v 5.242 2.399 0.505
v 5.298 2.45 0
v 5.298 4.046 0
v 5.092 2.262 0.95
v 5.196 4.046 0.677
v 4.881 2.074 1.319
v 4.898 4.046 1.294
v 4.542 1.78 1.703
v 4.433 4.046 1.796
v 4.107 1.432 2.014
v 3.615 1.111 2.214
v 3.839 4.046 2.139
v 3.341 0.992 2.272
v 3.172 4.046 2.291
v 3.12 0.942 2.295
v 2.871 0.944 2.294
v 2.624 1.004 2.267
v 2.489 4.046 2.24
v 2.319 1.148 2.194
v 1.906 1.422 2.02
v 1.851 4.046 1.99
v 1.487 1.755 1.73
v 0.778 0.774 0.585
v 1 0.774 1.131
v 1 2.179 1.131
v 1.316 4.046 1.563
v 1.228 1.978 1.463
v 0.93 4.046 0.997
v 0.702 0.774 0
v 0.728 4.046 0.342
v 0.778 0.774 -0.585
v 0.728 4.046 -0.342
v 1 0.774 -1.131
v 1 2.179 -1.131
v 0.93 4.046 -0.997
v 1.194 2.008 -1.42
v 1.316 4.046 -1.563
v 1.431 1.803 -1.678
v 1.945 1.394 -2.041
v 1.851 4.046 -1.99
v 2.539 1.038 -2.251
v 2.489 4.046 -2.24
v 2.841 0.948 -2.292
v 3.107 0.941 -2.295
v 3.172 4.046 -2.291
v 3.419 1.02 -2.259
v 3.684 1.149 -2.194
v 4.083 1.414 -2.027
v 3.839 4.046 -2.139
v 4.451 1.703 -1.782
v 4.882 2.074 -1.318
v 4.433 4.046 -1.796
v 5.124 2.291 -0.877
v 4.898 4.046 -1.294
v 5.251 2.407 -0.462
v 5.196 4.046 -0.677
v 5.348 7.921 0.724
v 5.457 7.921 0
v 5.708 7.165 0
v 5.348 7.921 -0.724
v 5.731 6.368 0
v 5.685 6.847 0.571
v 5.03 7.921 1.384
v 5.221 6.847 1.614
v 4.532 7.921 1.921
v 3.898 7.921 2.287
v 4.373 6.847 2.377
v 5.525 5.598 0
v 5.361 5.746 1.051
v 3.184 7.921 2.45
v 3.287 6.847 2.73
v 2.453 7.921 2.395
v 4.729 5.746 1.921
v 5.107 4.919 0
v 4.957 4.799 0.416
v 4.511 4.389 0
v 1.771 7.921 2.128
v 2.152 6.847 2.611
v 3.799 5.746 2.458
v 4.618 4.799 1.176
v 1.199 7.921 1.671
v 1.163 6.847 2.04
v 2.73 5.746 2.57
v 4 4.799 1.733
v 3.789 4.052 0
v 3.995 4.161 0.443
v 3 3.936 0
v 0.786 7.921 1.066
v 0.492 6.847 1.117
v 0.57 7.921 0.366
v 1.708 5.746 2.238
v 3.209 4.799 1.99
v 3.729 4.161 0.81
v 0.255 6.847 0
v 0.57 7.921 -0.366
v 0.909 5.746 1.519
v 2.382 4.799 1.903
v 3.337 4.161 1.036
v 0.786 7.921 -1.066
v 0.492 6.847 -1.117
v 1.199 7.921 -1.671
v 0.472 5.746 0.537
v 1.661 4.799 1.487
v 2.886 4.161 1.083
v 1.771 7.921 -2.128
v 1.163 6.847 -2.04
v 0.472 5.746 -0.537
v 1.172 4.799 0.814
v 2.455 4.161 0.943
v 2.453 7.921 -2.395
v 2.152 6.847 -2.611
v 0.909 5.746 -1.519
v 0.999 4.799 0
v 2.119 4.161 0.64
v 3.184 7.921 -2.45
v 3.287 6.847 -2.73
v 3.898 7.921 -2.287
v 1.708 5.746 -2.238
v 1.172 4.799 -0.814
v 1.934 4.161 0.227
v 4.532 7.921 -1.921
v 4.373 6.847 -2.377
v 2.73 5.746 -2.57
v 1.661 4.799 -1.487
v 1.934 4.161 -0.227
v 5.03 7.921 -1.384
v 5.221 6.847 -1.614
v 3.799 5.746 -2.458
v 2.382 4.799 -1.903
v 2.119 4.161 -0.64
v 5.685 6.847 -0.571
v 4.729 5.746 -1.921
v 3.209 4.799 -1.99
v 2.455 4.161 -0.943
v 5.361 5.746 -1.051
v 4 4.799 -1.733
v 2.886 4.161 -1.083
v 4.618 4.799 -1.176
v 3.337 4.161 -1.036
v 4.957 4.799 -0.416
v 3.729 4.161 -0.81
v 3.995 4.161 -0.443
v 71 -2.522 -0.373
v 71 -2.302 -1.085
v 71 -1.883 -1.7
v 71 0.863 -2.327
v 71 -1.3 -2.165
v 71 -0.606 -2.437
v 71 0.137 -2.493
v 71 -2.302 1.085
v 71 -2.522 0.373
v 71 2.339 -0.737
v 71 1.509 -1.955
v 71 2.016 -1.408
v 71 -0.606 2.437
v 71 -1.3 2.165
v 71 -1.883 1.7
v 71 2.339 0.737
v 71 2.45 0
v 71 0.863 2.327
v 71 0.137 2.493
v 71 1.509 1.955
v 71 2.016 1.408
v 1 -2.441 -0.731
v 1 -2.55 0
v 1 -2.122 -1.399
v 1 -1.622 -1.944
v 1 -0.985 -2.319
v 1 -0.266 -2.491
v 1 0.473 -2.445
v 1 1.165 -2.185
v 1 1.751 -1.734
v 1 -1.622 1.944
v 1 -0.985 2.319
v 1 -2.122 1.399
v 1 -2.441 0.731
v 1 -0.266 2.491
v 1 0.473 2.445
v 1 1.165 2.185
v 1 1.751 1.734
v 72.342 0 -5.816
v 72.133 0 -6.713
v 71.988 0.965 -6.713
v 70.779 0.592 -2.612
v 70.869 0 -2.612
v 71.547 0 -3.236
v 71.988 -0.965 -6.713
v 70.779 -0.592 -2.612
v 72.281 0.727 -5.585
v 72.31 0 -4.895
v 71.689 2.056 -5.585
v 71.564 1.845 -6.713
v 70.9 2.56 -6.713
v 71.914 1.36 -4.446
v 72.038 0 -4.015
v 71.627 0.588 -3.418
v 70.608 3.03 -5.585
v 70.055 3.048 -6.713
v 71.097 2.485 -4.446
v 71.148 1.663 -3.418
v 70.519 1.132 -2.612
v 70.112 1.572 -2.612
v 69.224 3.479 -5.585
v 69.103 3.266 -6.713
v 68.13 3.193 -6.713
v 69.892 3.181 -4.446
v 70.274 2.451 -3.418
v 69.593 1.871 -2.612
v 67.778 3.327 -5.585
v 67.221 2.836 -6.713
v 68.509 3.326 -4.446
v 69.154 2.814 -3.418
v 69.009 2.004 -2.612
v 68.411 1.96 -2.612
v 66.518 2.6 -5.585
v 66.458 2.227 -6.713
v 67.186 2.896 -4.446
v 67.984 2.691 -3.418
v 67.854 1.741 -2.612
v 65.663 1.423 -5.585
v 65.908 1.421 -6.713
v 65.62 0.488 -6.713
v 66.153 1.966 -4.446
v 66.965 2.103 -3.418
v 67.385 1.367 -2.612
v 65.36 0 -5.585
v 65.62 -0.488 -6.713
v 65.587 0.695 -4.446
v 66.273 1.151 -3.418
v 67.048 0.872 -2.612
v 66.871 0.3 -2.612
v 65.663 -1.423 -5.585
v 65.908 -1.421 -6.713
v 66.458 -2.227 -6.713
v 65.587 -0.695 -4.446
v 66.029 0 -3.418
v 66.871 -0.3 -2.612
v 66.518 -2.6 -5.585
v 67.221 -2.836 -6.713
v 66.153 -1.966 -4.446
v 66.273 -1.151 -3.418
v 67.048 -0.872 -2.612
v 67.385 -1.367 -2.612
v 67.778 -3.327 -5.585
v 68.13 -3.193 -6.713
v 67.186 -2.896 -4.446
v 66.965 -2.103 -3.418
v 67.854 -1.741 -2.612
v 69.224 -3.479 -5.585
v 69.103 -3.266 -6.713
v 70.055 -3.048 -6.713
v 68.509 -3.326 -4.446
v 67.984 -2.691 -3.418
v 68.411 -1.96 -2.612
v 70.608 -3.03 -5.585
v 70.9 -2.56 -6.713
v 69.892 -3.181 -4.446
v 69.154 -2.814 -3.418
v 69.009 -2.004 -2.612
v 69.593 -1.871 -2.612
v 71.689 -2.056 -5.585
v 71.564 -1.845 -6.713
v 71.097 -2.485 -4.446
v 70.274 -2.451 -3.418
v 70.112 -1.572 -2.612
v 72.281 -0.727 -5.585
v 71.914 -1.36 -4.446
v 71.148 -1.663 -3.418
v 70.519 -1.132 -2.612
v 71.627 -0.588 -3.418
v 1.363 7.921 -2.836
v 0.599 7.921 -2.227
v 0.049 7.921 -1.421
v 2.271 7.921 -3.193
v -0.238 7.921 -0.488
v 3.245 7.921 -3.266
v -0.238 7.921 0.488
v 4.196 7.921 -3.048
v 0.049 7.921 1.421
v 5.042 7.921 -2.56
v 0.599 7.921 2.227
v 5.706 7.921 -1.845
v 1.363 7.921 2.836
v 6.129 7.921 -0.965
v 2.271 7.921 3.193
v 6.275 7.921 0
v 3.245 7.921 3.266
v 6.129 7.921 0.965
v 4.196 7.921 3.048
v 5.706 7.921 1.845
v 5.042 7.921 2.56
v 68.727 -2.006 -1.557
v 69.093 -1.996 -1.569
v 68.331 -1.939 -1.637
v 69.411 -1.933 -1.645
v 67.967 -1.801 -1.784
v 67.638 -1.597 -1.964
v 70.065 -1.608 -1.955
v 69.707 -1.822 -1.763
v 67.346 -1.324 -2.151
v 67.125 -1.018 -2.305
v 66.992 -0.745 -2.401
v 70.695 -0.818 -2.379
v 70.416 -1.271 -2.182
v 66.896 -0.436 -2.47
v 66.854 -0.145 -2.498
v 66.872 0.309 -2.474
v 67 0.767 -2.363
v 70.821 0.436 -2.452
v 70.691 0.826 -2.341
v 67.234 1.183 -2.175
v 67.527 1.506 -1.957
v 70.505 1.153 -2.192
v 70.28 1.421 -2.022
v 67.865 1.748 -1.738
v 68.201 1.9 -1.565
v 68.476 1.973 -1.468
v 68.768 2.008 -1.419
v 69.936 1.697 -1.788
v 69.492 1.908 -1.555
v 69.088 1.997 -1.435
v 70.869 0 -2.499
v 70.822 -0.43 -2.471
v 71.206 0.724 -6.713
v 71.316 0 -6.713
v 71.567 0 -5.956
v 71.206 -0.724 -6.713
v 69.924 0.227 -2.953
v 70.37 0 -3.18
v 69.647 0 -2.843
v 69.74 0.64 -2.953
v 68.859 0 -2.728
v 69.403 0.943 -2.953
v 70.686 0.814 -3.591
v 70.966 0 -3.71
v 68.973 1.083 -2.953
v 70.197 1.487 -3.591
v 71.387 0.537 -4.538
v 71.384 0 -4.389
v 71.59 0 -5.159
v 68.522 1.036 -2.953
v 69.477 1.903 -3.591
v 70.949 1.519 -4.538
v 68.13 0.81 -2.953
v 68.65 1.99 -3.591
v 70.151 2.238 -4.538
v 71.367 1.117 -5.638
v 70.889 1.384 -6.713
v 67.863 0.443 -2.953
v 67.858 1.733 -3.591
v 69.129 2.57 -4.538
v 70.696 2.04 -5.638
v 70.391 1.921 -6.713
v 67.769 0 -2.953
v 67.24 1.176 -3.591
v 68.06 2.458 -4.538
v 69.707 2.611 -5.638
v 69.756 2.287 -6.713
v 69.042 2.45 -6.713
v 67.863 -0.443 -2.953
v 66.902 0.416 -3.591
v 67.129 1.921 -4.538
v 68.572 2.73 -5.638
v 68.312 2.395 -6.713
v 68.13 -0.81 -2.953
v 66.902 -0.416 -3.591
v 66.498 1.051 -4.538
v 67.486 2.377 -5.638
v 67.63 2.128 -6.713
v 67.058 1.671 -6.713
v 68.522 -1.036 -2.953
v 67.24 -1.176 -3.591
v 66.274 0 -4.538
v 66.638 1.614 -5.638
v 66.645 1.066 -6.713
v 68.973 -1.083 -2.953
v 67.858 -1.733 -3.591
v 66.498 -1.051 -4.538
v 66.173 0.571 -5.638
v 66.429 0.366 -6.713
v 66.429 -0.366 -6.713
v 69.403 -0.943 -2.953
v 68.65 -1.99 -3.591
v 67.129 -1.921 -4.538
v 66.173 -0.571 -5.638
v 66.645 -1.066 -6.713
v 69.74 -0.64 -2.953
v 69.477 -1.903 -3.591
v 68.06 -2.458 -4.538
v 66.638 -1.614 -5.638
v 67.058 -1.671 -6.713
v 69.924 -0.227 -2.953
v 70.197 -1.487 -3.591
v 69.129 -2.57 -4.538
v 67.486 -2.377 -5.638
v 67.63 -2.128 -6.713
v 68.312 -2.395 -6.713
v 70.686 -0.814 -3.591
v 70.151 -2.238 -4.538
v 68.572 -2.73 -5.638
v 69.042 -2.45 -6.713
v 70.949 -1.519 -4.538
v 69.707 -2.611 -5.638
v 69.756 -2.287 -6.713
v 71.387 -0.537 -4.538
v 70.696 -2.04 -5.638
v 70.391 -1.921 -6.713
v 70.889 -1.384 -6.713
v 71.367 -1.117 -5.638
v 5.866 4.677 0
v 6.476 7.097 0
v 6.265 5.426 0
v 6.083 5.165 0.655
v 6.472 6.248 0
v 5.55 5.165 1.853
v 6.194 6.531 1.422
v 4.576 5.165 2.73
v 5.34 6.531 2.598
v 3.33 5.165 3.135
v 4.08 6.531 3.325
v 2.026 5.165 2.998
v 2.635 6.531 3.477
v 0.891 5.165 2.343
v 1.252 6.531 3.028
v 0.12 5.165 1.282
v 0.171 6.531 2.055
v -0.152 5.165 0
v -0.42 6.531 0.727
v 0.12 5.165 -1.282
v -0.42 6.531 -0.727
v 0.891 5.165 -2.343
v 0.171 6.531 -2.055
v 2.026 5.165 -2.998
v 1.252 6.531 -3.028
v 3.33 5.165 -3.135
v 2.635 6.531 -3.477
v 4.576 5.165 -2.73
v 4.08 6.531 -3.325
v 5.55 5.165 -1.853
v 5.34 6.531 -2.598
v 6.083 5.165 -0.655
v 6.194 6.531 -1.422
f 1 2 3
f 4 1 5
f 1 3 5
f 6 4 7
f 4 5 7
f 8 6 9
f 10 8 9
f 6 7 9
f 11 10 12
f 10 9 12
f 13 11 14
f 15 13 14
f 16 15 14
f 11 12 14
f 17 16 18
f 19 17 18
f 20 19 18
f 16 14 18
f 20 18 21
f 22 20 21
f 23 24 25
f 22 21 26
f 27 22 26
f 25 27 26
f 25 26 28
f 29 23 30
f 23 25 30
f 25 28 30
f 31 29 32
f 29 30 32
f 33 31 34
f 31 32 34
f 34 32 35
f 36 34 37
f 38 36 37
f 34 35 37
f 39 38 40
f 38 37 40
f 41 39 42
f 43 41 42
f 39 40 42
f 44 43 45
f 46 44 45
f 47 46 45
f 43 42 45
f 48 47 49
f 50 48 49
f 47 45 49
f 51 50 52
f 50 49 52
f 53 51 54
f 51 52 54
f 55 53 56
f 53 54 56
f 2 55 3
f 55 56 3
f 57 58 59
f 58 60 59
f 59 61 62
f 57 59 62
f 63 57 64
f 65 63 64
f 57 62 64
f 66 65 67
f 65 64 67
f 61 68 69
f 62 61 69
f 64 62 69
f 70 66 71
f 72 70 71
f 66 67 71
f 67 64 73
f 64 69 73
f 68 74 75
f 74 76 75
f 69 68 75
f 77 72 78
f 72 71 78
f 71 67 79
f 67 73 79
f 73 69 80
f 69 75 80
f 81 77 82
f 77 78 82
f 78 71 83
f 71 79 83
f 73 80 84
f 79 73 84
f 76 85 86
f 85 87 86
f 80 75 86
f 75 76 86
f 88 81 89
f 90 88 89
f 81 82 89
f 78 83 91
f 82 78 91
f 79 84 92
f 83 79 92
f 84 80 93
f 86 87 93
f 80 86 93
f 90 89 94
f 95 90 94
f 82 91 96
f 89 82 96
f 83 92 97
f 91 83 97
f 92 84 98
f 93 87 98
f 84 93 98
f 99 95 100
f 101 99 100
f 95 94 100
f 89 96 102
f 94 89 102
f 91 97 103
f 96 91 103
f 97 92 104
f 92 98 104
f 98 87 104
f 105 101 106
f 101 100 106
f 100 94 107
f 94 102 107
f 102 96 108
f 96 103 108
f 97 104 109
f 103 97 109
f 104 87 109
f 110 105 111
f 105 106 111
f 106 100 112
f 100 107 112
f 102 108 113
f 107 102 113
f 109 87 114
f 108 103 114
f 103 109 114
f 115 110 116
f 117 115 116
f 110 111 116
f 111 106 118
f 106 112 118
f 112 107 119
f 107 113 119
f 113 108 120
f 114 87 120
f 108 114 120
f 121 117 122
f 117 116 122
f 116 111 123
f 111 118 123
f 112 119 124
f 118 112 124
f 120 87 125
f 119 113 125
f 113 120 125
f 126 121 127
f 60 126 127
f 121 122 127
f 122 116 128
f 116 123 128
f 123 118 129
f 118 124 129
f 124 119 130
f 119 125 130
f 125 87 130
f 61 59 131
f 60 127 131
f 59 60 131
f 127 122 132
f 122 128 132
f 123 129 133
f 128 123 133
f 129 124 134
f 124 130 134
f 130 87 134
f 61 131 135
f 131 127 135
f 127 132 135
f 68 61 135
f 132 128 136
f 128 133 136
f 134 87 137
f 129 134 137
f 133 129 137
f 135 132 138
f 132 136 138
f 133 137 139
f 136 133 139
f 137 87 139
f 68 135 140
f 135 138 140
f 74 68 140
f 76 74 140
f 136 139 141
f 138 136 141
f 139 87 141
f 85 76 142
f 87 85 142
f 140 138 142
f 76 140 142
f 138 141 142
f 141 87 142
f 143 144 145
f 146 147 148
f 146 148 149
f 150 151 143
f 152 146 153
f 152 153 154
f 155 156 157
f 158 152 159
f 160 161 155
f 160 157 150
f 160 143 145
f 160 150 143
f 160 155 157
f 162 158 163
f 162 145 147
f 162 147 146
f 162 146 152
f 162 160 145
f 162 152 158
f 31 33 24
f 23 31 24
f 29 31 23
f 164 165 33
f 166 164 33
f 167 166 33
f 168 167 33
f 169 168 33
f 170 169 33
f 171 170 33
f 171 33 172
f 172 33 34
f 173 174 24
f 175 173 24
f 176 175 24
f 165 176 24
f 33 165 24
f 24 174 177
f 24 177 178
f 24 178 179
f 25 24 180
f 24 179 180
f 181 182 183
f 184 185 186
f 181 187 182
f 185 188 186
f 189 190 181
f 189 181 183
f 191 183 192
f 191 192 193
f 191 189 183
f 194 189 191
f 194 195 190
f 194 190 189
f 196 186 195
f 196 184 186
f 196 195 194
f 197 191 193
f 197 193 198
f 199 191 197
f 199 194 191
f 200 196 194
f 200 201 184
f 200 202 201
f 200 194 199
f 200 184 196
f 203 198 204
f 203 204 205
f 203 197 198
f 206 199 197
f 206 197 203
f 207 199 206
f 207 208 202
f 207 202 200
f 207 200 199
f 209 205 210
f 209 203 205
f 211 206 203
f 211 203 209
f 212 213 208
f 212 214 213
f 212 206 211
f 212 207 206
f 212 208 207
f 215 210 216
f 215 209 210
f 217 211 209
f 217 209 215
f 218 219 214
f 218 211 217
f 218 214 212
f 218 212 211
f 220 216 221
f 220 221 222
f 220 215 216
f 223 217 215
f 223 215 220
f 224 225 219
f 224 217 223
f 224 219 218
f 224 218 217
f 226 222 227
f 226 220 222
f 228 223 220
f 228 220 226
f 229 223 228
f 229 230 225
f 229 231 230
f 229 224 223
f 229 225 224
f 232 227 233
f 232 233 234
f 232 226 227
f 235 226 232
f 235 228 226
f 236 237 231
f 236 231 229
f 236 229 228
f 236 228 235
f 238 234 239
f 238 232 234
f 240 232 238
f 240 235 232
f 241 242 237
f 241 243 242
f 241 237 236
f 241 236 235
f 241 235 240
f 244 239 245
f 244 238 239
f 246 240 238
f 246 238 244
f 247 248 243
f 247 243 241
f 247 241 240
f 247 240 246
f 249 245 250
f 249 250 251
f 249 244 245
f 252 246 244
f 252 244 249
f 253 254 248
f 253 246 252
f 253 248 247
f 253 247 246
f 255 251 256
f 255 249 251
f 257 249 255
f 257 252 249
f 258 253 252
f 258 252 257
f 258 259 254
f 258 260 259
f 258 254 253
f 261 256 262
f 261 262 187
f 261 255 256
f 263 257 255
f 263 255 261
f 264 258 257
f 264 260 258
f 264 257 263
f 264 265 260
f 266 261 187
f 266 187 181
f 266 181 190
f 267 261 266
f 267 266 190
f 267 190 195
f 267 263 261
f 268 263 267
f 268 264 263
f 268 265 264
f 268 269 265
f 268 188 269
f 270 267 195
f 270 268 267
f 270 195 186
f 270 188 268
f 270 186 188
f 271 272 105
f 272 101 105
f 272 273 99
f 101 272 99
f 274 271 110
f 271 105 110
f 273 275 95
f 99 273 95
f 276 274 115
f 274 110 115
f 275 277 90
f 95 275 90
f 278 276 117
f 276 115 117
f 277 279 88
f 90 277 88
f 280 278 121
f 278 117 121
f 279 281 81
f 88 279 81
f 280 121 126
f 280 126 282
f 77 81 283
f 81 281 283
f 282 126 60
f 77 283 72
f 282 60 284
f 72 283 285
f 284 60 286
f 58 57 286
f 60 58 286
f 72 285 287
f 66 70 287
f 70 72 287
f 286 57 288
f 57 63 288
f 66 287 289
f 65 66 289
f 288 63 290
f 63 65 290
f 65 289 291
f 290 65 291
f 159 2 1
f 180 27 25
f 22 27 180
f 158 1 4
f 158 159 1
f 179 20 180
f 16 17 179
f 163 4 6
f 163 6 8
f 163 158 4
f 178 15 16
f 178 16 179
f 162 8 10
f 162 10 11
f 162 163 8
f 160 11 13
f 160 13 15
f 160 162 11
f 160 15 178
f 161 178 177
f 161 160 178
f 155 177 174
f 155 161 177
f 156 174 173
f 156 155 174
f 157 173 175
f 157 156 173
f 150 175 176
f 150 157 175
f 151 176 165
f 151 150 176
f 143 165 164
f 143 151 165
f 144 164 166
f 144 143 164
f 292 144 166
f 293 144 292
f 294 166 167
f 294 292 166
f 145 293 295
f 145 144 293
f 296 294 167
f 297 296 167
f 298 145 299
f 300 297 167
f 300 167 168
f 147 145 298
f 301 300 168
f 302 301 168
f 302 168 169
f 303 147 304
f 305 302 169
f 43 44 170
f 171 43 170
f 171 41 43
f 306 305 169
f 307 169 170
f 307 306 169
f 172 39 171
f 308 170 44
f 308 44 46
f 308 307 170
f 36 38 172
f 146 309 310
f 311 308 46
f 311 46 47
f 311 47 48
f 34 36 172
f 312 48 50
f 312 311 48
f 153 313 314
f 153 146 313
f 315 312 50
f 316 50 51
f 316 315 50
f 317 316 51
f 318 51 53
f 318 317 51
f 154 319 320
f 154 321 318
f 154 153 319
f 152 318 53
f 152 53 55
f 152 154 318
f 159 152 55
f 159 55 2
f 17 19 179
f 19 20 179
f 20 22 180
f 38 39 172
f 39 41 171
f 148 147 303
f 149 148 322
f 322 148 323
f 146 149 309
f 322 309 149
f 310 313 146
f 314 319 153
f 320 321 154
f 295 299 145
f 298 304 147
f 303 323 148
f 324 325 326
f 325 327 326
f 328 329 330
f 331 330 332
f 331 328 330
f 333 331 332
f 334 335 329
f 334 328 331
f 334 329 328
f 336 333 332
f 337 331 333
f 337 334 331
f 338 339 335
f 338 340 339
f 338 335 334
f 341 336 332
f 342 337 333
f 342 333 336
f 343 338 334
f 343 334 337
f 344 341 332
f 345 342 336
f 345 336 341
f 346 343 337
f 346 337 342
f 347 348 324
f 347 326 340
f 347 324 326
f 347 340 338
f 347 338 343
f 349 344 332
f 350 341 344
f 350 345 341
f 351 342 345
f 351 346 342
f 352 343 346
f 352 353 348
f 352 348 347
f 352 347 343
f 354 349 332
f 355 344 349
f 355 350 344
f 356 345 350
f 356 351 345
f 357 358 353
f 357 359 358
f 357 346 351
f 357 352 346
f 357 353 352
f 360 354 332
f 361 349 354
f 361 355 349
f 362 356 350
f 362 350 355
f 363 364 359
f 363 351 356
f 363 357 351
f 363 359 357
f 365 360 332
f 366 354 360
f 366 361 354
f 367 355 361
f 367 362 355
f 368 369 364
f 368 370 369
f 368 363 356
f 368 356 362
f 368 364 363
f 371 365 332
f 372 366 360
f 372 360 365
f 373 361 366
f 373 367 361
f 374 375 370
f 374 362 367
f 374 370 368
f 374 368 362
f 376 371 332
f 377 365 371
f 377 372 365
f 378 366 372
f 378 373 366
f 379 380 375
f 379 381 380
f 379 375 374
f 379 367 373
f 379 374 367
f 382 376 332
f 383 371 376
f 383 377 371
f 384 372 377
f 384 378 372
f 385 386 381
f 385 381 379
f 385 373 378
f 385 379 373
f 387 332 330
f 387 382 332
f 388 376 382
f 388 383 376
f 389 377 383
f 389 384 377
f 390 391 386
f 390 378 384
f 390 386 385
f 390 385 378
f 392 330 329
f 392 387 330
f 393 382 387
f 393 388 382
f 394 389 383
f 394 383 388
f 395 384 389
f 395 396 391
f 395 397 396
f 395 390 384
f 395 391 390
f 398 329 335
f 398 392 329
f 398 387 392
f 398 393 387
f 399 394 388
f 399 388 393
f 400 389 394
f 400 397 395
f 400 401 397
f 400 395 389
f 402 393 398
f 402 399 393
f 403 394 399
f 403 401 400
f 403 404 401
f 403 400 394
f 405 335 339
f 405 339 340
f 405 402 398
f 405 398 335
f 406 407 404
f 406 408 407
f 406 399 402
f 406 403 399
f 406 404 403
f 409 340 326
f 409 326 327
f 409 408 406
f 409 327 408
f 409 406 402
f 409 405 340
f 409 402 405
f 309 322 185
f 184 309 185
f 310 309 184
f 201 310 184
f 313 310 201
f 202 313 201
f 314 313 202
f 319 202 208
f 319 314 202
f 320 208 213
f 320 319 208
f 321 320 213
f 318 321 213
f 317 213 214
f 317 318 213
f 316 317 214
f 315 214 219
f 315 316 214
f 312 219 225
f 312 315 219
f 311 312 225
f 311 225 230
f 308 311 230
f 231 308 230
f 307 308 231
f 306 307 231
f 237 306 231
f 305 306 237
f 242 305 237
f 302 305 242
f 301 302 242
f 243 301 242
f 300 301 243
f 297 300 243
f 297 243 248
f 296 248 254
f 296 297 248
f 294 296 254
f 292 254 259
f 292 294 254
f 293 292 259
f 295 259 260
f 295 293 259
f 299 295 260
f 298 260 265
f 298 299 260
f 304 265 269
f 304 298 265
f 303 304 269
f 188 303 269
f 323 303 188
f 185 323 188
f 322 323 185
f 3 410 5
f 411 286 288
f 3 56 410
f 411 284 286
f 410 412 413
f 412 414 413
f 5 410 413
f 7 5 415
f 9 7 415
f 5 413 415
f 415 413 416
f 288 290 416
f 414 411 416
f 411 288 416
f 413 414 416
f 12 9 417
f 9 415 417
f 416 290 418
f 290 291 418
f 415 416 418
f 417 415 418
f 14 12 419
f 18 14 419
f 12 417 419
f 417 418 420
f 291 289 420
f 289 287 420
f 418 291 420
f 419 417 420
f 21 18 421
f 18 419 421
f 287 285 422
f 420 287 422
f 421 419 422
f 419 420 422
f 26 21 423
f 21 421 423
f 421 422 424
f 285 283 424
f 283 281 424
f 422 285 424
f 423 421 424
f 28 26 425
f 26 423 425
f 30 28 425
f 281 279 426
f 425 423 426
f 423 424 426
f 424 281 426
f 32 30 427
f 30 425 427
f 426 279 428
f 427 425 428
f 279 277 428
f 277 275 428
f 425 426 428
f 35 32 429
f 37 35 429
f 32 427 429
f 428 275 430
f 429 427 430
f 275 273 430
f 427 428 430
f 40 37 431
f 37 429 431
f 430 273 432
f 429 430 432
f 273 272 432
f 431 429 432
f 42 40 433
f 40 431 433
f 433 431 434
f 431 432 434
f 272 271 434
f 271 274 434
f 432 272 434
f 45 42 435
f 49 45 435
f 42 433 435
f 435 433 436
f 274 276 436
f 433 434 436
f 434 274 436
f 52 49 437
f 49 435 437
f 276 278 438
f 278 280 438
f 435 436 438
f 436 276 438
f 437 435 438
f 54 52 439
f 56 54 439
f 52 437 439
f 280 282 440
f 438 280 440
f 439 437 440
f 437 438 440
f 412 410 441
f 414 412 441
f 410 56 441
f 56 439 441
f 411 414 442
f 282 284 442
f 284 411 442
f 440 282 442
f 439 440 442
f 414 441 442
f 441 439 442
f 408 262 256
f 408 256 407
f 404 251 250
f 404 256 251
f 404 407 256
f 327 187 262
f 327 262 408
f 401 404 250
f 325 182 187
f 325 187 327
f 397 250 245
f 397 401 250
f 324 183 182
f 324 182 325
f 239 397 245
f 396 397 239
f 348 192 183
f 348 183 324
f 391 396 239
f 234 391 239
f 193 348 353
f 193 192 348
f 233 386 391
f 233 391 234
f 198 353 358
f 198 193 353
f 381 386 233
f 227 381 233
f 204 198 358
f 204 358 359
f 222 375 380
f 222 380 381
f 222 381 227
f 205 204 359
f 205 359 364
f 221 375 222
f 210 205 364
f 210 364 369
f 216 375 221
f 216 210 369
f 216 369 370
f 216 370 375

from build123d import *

# Parameters (mm, degrees)
F3_R     = 2.5
F4_DEPTH = 35


with BuildPart() as f1:
    # F0 (on Top) → F1 (revolve)
    with BuildSketch(Plane.XY):
        with BuildLine():
            Line((3, 10.3863353059), (3, 7.9742954113))
            Line((3, 7.9742954113), (5.297709696, 7.9742954113))
            Line((5.297709696, 7.9742954113), (5.297709696, 10.7682199602))
            Line((5.297709696, 10.7682199602), (5.297709696, 11.2461591464))
            ThreePointArc((5.297709696, 11.2461591464), (4.226658763, 10.6083316025), (3, 10.3863353059))
        make_face()
        with BuildLine():
            Line((3, 11.1363353059), (3, 10.3863353059))
            ThreePointArc((3, 10.3863353059), (4.226658763, 10.6083316025), (5.297709696, 11.2461591464))
            ThreePointArc((5.297709696, 11.2461591464), (6.3937863673, 13.0306402124), (6.2748163897, 15.1214780561))
            Line((6.2748163897, 15.1214780561), (5.4570149341, 15.1214780561))
            ThreePointArc((5.4570149341, 15.1214780561), (5.3408484106, 12.4430998024), (3, 11.1363353059))
        make_face()
    revolve(axis=Axis((3, 12.1363353059, 0), (0, -1, 0)))

    # F3 (on offset) → F4 (join, symmetric)
    with BuildSketch(Plane.YZ.offset(36)):
        with Locations((7.1499980986, 0)):
            Circle(F3_R)
    extrude(amount=F4_DEPTH, both=True)


with BuildPart() as f1_1:
    # F5: moved
    add(f1.part.moved(Location((0, -7.2, 0))))

    # F6 (on Front) → F7 (revolve)
    with BuildSketch(Plane.XZ):
        with BuildLine():
            ThreePointArc((68.8586309552, -2.7275545988), (71.1994793659, -4.0343190953), (71.3156458893, -6.712697349))
            Line((71.3156458893, -6.712697349), (72.133447345, -6.712697349))
            ThreePointArc((72.133447345, -6.712697349), (72.2031454778, -4.4459429431), (70.8686844446, -2.612299816))
            ThreePointArc((70.8686844446, -2.612299816), (69.9125778847, -2.1400112103), (68.8586309552, -1.9775545988))
            Line((68.8586309552, -1.9775545988), (68.8586309552, -2.7275545988))
        make_face()
        with BuildLine():
            Line((68.8586309552, 0.4344852958), (68.8586309552, -1.9775545988))
            ThreePointArc((68.8586309552, -1.9775545988), (69.9125778847, -2.1400112103), (70.8686844446, -2.612299816))
            Line((70.8686844446, -2.612299816), (70.8686844446, 0.4344852958))
            Line((70.8686844446, 0.4344852958), (68.8586309552, 0.4344852958))
        make_face()
    revolve(axis=Axis((68.8586309552, 0, -3.7275545988), (0, 0, 1)))


solid = f1_1.part
